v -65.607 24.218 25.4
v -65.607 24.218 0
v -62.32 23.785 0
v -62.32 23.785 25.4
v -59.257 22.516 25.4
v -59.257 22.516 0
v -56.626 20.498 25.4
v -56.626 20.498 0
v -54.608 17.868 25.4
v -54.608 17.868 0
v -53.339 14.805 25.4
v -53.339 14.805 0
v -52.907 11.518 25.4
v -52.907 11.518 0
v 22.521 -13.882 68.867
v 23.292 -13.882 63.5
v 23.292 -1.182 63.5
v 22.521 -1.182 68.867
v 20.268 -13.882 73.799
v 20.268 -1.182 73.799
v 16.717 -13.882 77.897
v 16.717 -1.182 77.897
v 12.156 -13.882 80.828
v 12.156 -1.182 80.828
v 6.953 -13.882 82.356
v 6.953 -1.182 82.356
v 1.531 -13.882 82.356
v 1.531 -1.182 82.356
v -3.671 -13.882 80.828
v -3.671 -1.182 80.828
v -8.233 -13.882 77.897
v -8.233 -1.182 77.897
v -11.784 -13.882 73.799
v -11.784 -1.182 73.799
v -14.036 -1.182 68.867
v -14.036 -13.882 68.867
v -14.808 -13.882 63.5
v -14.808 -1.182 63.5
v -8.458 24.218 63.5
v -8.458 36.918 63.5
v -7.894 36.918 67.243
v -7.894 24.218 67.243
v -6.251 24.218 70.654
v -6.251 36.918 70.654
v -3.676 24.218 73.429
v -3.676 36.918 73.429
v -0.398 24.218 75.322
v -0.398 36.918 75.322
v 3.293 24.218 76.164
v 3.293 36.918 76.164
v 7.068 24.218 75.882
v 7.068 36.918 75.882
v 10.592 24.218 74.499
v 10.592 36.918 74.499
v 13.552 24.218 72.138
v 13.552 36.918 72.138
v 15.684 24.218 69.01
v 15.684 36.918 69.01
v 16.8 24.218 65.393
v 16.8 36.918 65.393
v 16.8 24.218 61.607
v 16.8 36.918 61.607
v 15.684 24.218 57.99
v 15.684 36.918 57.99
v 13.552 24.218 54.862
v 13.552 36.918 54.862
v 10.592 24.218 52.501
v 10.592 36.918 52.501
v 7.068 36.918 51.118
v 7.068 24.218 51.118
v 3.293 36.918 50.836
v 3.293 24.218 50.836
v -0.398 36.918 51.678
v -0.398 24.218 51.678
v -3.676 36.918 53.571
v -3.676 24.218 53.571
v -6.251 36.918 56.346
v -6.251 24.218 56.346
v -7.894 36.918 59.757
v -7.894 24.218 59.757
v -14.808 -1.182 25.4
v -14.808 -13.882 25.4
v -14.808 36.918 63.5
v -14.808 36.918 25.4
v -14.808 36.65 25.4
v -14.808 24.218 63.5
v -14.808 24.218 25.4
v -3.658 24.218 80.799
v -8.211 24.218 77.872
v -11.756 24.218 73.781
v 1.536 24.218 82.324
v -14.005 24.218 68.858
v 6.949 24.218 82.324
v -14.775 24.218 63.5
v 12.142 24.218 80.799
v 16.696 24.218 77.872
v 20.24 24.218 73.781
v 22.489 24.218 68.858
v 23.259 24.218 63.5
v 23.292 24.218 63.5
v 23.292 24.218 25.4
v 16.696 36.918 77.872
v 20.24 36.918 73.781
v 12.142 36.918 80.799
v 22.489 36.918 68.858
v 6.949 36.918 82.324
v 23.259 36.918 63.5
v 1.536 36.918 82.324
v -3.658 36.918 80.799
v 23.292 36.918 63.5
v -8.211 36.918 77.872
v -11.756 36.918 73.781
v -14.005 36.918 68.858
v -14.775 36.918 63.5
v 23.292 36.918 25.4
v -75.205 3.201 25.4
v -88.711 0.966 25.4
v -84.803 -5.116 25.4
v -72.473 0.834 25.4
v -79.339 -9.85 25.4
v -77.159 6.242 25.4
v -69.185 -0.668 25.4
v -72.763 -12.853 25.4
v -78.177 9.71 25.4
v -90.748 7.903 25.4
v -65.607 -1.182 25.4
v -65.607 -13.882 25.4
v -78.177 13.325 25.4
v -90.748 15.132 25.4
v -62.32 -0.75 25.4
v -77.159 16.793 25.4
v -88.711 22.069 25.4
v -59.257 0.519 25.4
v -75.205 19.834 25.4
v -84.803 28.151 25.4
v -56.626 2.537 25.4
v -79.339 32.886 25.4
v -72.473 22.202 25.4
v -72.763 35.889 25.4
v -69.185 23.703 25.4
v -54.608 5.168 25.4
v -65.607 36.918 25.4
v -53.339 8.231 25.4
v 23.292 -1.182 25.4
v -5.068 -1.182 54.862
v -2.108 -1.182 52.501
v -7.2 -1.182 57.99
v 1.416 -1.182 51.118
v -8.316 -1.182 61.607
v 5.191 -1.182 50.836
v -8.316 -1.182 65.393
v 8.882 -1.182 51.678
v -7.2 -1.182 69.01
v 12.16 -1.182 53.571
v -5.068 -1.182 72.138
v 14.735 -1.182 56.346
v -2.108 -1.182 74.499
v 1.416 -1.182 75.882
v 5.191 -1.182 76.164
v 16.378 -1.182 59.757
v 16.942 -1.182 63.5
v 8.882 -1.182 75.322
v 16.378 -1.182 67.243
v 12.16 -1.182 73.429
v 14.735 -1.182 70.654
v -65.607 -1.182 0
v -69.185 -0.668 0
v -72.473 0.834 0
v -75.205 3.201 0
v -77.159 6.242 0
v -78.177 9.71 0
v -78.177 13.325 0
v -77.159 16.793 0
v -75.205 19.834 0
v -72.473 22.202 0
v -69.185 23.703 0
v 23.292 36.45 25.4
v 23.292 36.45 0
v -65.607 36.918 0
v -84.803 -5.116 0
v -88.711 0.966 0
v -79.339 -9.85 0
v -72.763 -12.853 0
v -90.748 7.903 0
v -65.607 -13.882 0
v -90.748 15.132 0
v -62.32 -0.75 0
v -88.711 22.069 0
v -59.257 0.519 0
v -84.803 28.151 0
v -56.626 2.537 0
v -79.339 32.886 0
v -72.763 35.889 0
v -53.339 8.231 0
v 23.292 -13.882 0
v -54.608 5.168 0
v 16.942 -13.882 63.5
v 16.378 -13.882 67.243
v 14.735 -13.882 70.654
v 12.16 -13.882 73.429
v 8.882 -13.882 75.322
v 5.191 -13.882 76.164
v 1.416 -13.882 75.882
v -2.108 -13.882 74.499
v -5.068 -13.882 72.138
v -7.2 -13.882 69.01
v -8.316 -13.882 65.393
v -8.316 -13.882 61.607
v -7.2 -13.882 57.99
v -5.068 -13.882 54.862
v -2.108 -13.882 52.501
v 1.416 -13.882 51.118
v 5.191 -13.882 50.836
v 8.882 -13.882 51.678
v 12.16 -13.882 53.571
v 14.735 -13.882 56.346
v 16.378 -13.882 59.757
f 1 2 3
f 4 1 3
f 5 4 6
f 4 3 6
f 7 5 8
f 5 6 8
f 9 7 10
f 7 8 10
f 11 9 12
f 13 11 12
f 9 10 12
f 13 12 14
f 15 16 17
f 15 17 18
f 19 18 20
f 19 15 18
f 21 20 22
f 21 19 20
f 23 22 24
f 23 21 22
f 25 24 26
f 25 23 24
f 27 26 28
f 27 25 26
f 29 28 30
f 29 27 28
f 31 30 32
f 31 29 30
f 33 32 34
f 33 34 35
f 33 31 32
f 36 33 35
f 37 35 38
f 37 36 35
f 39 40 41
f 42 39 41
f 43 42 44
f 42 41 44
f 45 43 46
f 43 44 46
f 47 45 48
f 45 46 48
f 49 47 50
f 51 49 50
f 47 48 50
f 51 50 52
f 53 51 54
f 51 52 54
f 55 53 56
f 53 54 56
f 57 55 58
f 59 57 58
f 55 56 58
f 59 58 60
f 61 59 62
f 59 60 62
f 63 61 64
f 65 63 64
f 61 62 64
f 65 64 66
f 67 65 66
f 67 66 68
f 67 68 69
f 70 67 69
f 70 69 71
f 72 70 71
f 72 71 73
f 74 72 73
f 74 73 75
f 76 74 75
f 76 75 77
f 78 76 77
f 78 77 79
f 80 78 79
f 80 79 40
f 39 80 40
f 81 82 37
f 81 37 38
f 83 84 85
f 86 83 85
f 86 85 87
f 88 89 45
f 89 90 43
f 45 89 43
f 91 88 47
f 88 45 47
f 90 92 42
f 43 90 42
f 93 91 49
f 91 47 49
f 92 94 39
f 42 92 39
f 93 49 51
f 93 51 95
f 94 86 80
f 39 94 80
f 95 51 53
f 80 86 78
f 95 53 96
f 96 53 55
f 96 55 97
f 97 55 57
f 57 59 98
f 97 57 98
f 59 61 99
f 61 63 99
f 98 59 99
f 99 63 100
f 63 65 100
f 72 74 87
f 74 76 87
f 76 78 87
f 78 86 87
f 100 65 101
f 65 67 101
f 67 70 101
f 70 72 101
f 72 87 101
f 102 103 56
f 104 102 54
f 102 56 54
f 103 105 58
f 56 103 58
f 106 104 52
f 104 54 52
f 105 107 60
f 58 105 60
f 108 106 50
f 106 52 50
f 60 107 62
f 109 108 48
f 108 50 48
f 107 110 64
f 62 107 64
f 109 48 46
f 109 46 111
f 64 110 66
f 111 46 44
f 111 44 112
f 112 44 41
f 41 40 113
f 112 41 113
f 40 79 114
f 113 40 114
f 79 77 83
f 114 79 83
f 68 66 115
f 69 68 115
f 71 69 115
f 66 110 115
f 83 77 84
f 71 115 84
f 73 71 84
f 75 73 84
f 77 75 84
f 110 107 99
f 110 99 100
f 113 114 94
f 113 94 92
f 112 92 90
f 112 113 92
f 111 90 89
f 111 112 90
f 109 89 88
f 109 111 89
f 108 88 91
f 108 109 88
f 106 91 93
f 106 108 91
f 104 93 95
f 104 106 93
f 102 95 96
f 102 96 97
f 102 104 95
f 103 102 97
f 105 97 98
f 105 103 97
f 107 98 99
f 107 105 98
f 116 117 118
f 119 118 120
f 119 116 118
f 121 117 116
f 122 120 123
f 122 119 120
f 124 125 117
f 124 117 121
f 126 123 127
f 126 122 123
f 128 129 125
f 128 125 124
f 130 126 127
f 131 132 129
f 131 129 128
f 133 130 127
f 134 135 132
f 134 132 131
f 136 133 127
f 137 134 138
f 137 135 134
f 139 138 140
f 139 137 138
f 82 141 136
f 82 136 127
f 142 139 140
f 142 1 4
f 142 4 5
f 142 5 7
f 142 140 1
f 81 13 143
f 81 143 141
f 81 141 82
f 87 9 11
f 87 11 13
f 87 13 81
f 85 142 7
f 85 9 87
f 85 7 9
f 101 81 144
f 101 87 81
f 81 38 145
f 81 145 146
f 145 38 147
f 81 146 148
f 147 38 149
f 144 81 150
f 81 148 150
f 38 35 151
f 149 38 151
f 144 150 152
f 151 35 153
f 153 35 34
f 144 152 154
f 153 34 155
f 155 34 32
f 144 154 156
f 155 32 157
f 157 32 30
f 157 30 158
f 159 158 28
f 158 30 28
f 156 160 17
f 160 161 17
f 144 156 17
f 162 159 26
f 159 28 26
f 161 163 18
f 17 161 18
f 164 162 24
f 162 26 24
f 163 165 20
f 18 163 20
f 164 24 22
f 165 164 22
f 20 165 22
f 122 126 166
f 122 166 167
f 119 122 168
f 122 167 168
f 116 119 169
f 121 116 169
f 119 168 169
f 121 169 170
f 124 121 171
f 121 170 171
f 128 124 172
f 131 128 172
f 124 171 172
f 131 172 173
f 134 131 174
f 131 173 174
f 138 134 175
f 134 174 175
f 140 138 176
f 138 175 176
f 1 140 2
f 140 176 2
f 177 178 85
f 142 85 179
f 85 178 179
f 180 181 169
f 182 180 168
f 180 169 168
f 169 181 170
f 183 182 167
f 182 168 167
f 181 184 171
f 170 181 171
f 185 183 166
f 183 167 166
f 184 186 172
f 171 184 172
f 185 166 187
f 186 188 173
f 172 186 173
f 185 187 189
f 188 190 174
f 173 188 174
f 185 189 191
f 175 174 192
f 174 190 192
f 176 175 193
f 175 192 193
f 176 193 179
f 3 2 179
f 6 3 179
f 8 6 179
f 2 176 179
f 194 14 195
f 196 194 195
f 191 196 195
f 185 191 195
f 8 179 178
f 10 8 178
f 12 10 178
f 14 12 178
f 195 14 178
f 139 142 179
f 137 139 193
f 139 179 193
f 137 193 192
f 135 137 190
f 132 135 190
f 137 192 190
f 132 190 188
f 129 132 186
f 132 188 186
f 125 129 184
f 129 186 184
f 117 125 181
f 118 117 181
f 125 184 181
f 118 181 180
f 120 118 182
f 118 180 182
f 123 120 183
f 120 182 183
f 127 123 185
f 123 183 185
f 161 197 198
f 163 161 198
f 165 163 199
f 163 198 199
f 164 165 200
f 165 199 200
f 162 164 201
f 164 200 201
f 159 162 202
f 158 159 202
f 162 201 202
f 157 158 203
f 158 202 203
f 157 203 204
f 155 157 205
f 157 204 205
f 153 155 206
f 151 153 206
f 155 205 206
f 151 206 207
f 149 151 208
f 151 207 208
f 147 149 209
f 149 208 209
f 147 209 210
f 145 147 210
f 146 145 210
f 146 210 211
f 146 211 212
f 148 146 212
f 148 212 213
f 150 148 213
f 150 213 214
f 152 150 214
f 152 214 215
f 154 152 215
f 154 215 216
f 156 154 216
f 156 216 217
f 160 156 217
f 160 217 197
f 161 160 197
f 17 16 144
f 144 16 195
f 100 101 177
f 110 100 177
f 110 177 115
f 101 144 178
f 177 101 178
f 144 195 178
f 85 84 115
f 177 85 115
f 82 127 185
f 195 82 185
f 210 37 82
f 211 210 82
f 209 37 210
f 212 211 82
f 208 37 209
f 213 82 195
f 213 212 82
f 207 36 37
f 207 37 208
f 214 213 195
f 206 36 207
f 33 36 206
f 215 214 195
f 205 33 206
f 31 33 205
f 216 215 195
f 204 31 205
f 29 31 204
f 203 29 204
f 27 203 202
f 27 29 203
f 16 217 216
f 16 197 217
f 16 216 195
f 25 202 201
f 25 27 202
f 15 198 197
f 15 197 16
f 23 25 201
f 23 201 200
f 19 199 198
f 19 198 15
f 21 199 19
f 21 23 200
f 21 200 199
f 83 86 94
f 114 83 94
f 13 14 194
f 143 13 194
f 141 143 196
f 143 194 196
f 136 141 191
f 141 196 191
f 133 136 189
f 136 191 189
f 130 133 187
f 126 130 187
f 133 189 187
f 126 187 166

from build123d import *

# Parameters (mm, degrees)
F1_DEPTH  = 25.4
F3_DEPTH  = 38.1
F2_W      = 38.1
F2_H      = 12.7
F4_DEPTH  = 38.1
F6_DEPTH  = 12.7
F7_R      = 12.7
F8_DEPTH  = 38.1
F10_DEPTH = 12.7
F12_DEPTH = 38.1


with BuildPart() as f1:
    # F0 (on Top) → F1 (new body)
    with BuildSketch(Plane.XY):
        with BuildLine():
            Line((23.2921783298, 36.4497782979), (-65.6065904021, 36.9176649997))
            Line((-65.6065904021, 36.9176649997), (-65.6065904021, 24.2176649997))
            ThreePointArc((-65.6065904021, 24.2176649997), (-56.626334281, 20.4979211207), (-52.9065904021, 11.5176649997))
            ThreePointArc((-52.9065904021, 11.5176649997), (-56.626334281, 2.5374088786), (-65.6065904021, -1.1823350003))
            Line((-65.6065904021, -1.1823350003), (-65.6065904021, -13.8823350003))
            Line((-65.6065904021, -13.8823350003), (23.2921783298, -13.8823350003))
            Line((23.2921783298, -13.8823350003), (23.2921783298, 36.4497782979))
        make_face()
        with BuildLine():
            Line((-65.6065904021, 24.2176649997), (-65.6065904021, 36.9176649997))
            ThreePointArc((-65.6065904021, 36.9176649997), (-91.0065904021, 11.5176649997), (-65.6065904021, -13.8823350003))
            Line((-65.6065904021, -13.8823350003), (-65.6065904021, -1.1823350003))
            ThreePointArc((-65.6065904021, -1.1823350003), (-78.3065904021, 11.5176649997), (-65.6065904021, 24.2176649997))
        make_face()
    extrude(amount=F1_DEPTH)

    # F2 (on face) → F3 (join)
    with BuildSketch(Plane.XY.offset(25.4)):
        Polygon((-14.8078216702, 36.9176649997), (-14.8078216702, 36.6503039473), (23.2921783298, 36.4497782979), (23.2921783298, 36.9176649997), align=None)
        Polygon((-14.8078216702, 24.2176649997), (23.2921783298, 24.2176649997), (23.2921783298, 36.4497782979), (-14.8078216702, 36.6503039473), align=None)
    extrude(amount=F3_DEPTH)

    # F2 (on face) → F4 (join)
    with BuildSketch(Plane.XY.offset(25.4)):
        with Locations((4.2421783298, -7.5323350003)):
            Rectangle(F2_W, F2_H)
    extrude(amount=F4_DEPTH)

    # F5 (on face) → F6 (join)
    with BuildSketch(Plane(origin=(0, 36.9176649997, 0), x_dir=(-1, 0, 0), z_dir=(0, 1, 0))):
        with BuildLine():
            Line((-23.2594181519, 63.5), (14.7750614924, 63.5))
            ThreePointArc((14.7750614924, 63.5), (-4.2421783298, 82.5172398221), (-23.2594181519, 63.5))
        make_face()
    extrude(amount=-F6_DEPTH)

    # F7 (on face) → F8 (cut)
    with BuildSketch(Plane(origin=(0, 36.9176649997, 0), x_dir=(-1, 0, 0), z_dir=(0, 1, 0))):
        with Locations((-4.2421783298, 63.5)):
            Circle(F7_R)
    extrude(amount=-F8_DEPTH, mode=Mode.SUBTRACT)

    # F9 (on face) → F10 (join)
    with BuildSketch(Plane.XZ.offset(13.8823350003)):
        with BuildLine():
            Line((-14.8078216702, 63.5), (23.2921783298, 63.5))
            ThreePointArc((23.2921783298, 63.5), (4.2421783298, 82.55), (-14.8078216702, 63.5))
        make_face()
    extrude(amount=-F10_DEPTH)

    # F11 (on face) → F12 (cut)
    with BuildSketch(Plane.XZ.offset(13.8823350003)):
        with BuildLine():
            ThreePointArc((-8.4578216702, 63.5), (4.2421783298, 50.8), (16.9421783298, 63.5))
            Line((16.9421783298, 63.5), (-8.4578216702, 63.5))
        make_face()
        with BuildLine():
            Line((-8.4578216702, 63.5), (16.9421783298, 63.5))
            ThreePointArc((16.9421783298, 63.5), (4.2421783298, 76.2), (-8.4578216702, 63.5))
        make_face()
    extrude(amount=-F12_DEPTH, mode=Mode.SUBTRACT)


solid = f1.part
